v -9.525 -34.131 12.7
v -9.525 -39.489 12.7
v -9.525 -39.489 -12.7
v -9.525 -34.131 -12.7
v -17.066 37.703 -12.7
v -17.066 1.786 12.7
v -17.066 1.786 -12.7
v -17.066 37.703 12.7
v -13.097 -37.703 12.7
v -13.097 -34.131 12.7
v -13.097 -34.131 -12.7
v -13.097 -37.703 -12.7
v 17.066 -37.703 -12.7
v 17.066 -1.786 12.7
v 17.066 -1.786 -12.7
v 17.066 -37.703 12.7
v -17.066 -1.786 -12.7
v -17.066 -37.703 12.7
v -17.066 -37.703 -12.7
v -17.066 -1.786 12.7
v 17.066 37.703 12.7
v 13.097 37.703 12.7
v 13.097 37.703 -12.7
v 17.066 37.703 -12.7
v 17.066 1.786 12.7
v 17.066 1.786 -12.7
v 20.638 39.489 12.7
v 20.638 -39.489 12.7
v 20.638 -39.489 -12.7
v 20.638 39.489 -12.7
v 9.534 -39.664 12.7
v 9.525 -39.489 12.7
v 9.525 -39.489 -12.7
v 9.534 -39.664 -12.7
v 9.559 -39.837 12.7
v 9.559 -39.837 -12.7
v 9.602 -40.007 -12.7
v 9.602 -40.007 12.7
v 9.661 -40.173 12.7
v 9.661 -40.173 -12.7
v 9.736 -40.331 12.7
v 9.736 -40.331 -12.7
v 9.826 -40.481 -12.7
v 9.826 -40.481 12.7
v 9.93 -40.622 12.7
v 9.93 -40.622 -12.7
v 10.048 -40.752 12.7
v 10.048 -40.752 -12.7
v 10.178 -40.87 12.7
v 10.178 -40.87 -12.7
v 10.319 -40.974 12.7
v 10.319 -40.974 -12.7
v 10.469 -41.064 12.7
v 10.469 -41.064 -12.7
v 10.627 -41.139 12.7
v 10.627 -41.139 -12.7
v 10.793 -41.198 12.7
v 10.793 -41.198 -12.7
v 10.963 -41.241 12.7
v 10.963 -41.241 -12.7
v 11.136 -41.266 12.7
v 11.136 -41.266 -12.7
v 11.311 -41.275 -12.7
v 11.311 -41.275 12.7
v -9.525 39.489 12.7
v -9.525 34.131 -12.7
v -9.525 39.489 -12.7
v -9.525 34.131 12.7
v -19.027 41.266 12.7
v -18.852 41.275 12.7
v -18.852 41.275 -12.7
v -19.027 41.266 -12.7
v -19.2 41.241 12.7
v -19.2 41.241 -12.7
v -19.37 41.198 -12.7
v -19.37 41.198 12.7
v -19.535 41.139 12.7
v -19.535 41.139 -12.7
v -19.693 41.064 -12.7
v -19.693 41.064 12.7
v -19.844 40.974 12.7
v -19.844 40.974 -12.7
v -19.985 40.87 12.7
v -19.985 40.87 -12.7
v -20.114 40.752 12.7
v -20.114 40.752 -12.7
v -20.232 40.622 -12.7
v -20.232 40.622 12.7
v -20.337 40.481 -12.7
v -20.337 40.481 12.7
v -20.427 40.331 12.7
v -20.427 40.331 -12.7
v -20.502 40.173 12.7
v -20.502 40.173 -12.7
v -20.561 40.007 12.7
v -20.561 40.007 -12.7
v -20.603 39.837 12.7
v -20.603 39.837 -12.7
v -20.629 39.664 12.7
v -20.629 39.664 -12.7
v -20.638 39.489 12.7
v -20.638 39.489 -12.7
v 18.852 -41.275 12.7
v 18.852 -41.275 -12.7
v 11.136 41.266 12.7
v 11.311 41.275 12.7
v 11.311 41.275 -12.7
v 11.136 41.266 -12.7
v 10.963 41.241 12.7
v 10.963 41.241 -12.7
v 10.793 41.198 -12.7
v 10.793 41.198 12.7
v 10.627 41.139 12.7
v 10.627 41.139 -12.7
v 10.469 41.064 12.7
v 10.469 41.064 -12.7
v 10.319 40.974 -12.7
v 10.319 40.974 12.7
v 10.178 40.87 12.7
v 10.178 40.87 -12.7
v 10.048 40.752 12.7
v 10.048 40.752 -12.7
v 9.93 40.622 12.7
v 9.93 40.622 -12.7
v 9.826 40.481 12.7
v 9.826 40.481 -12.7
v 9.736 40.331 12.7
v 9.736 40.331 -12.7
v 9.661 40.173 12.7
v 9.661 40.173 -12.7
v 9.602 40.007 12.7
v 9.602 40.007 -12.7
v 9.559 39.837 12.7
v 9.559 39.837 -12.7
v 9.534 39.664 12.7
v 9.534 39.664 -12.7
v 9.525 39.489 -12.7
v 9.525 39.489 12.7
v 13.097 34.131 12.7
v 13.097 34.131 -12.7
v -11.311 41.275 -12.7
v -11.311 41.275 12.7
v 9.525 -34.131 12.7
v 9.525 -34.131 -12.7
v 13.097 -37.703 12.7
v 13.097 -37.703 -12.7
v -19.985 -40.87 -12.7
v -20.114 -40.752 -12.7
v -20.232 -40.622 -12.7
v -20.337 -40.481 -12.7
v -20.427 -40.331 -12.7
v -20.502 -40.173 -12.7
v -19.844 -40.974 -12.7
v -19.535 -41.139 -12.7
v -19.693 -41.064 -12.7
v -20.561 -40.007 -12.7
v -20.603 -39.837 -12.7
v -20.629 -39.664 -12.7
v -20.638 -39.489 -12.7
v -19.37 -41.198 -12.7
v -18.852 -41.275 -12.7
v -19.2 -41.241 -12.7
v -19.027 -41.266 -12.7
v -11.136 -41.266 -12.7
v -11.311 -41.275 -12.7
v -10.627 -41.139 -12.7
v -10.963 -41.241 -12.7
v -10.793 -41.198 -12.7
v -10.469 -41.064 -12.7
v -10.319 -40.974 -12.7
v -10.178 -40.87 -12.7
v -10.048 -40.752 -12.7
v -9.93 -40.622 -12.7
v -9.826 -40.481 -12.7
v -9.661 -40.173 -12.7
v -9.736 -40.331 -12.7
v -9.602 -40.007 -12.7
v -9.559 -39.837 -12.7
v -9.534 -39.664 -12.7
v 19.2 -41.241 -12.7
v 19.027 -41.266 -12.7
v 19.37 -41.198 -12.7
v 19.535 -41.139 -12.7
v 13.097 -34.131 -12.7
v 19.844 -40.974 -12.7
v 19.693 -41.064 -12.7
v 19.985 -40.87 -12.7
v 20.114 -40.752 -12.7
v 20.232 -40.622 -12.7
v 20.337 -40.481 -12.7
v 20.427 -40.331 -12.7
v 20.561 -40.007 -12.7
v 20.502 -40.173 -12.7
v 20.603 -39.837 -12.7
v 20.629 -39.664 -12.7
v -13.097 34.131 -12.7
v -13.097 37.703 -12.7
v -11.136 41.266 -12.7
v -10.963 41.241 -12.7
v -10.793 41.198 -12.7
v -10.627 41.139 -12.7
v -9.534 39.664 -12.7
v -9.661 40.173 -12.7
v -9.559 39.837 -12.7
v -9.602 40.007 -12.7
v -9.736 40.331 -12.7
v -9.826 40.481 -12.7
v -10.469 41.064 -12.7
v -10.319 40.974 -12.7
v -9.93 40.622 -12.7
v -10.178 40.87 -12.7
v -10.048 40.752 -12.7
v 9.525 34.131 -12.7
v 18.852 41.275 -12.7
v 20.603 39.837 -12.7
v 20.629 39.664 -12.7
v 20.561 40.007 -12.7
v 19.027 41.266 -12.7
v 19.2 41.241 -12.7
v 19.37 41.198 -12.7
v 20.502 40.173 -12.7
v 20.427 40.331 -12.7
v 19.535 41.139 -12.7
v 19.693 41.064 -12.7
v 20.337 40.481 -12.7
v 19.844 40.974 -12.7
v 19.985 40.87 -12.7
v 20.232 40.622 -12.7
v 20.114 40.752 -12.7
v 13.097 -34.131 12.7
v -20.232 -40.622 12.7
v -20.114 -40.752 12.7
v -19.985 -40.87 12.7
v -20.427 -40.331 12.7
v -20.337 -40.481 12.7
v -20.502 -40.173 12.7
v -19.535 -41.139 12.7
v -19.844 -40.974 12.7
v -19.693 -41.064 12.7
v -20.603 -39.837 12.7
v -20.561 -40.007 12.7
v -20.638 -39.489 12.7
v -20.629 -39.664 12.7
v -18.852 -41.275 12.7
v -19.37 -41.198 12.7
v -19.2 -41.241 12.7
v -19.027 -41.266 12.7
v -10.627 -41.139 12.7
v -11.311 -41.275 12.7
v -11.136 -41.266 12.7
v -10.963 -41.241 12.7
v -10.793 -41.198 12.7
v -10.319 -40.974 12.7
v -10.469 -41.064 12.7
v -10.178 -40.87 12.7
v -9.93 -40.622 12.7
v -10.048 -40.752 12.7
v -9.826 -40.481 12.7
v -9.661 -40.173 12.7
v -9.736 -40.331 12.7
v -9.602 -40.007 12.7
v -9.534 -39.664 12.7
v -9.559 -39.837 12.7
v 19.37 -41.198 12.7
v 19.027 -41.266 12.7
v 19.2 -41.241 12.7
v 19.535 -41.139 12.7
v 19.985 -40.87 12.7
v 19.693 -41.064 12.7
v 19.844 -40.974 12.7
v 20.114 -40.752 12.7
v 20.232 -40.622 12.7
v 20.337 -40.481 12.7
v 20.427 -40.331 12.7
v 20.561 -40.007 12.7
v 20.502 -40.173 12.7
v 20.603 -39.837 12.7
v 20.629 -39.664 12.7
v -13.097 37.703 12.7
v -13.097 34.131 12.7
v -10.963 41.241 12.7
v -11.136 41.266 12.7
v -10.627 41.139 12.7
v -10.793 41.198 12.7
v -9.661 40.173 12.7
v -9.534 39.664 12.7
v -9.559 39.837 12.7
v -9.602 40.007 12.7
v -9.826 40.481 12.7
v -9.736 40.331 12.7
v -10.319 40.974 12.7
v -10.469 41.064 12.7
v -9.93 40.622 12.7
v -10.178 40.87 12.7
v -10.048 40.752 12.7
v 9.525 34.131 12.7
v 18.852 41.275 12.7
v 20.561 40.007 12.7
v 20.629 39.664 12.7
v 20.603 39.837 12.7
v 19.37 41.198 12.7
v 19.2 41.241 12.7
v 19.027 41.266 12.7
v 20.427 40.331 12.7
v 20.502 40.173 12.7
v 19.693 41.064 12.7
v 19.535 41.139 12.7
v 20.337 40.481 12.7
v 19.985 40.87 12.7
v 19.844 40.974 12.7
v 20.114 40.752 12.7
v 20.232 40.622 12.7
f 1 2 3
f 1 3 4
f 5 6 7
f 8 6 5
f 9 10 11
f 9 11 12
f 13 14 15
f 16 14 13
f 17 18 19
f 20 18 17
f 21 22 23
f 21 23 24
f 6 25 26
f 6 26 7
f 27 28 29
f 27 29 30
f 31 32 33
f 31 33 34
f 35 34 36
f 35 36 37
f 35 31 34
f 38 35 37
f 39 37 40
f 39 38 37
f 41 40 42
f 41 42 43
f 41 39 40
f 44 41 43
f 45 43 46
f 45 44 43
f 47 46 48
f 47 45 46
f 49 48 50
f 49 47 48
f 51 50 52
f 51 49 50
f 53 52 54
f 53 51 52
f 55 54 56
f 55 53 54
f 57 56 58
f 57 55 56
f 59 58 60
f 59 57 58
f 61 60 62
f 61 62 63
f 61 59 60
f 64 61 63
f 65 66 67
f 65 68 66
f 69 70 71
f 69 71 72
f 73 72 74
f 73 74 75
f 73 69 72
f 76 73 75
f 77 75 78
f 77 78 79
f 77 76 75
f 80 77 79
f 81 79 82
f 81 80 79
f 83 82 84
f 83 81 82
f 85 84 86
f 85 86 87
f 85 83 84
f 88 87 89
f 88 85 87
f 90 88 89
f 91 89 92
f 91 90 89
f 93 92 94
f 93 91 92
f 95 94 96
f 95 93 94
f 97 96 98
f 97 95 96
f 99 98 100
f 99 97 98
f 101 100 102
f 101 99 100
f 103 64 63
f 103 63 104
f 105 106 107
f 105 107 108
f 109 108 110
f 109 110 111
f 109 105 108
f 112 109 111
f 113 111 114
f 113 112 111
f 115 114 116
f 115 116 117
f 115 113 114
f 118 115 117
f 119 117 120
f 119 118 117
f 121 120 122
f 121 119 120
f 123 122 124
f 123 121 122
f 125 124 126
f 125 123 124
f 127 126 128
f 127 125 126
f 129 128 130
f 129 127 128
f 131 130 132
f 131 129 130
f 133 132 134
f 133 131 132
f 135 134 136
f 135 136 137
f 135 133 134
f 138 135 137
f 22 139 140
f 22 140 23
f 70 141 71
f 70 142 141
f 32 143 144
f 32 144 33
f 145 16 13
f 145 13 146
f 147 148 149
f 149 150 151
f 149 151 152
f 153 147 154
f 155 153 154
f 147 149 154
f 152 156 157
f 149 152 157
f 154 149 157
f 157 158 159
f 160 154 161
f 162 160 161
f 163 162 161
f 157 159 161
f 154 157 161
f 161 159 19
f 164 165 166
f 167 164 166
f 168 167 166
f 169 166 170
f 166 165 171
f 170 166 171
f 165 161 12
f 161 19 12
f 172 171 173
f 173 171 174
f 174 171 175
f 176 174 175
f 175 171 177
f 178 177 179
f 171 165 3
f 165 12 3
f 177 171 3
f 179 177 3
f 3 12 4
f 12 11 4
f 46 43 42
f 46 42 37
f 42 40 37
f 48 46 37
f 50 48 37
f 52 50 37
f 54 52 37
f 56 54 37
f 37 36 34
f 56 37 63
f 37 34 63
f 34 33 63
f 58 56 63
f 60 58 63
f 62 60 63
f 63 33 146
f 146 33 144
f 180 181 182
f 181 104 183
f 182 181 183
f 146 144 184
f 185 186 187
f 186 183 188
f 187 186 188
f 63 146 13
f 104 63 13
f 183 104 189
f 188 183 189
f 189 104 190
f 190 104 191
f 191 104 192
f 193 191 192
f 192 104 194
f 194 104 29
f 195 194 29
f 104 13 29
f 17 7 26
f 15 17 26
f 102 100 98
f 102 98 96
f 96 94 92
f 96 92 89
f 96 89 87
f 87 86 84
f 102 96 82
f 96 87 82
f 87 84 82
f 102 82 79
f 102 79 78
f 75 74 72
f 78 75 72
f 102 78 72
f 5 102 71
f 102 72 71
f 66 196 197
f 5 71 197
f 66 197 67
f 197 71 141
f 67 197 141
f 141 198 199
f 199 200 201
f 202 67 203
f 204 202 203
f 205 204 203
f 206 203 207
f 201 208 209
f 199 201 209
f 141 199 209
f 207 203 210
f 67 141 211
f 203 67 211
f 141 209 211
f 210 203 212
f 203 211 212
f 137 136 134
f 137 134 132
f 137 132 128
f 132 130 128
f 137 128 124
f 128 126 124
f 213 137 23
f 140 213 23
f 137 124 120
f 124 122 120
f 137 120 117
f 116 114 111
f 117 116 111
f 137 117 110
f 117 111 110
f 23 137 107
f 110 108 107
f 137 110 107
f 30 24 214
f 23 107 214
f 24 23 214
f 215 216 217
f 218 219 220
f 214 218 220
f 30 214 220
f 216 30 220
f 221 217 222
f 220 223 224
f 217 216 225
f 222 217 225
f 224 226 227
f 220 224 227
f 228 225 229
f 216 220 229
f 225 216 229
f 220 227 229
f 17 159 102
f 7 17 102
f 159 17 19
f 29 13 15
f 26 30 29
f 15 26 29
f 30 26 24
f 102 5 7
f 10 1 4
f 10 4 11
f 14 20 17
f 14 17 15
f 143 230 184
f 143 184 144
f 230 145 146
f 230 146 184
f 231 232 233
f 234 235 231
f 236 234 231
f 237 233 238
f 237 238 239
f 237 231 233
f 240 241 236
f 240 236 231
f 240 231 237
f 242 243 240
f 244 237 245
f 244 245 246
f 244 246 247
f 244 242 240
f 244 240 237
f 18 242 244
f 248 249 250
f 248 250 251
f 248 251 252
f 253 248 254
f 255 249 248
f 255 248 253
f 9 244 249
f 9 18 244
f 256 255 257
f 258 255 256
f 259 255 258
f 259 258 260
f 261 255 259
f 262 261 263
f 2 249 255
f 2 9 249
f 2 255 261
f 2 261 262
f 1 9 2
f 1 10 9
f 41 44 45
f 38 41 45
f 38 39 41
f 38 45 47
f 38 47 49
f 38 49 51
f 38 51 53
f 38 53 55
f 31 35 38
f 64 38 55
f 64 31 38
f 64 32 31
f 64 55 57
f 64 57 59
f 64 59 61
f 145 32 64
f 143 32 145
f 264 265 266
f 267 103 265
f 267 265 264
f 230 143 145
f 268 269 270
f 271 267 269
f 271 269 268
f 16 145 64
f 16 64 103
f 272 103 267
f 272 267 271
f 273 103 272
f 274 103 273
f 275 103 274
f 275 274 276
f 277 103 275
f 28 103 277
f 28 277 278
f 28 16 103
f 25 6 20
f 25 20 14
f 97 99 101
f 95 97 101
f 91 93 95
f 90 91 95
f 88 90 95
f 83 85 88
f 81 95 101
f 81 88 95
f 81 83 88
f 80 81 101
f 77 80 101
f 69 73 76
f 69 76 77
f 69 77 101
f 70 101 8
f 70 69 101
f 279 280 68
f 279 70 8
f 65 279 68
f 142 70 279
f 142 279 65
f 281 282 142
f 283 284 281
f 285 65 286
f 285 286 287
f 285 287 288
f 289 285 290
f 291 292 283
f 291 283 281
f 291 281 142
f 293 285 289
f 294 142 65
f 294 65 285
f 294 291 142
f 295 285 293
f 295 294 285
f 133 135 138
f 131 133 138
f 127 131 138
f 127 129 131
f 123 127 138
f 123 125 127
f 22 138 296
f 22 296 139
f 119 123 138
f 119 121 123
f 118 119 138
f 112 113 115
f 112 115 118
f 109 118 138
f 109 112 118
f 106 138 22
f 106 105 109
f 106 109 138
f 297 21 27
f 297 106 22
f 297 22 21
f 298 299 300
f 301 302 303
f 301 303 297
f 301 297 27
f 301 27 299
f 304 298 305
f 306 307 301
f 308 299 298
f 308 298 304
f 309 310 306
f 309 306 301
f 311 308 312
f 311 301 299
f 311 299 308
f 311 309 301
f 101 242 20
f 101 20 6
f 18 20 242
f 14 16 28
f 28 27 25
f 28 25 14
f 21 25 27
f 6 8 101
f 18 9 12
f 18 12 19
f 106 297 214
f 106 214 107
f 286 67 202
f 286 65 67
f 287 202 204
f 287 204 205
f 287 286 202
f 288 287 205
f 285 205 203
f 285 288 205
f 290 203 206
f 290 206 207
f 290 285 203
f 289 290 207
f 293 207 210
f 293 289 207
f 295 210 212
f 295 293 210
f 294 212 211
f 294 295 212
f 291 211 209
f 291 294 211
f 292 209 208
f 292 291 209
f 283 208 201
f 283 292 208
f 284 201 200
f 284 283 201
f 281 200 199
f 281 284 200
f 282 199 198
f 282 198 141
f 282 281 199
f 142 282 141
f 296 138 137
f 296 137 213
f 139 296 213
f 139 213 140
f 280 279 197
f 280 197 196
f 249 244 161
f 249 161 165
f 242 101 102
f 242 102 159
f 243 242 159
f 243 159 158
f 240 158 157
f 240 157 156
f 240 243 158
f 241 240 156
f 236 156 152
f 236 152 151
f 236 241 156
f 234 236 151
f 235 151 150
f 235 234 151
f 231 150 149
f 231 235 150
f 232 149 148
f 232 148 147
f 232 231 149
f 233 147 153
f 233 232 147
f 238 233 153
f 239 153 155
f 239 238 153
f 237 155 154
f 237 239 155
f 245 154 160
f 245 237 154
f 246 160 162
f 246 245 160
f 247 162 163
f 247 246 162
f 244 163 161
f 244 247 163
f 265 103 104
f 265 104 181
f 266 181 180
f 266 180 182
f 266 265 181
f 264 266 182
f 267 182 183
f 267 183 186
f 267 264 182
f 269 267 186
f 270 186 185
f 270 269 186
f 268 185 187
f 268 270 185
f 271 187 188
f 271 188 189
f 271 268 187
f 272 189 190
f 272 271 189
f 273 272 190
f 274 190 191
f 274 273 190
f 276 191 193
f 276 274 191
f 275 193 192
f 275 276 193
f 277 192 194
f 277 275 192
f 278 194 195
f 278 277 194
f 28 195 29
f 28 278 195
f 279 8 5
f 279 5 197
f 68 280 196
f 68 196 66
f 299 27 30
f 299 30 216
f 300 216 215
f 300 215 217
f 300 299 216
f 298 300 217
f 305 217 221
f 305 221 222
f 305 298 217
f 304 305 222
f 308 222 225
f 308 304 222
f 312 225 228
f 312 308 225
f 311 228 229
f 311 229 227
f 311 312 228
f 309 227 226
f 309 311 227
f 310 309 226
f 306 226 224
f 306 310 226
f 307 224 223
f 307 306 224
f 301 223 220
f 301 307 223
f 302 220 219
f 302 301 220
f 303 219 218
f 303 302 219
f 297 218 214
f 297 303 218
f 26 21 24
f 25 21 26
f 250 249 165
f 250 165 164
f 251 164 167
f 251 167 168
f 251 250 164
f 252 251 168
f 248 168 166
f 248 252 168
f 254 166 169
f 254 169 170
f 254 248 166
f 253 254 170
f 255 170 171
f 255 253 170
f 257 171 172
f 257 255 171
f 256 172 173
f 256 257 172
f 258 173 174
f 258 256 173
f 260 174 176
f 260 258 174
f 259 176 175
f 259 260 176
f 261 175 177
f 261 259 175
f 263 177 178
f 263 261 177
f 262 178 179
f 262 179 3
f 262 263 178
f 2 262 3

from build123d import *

# Parameters (mm, degrees)
BASE_EXTRUDE_DEPTH = 12.7


with BuildPart() as part:
    # Sketch1 → Base-Extrude (new, symmetric)
    with BuildSketch(Plane.XY):
        with BuildLine():
            Line((-11.3109375, 41.275), (-18.8515625, 41.275))
            ThreePointArc((-18.8515625, 41.275), (-20.114411017, 40.751911017), (-20.6375, 39.4890625))
            Line((-20.6375, 39.4890625), (-20.6375, -39.4890625))
            ThreePointArc((-20.6375, -39.4890625), (-20.114411017, -40.751911017), (-18.8515625, -41.275))
            Line((-18.8515625, -41.275), (-11.3109375, -41.275))
            ThreePointArc((-11.3109375, -41.275), (-10.048088983, -40.751911017), (-9.525, -39.4890625))
            Line((-9.525, -39.4890625), (-9.525, -34.13125))
            Line((-9.525, -34.13125), (-13.096875, -34.13125))
            Line((-13.096875, -34.13125), (-13.096875, -37.703125))
            Line((-13.096875, -37.703125), (-17.065625, -37.703125))
            Line((-17.065625, -37.703125), (-17.065625, -1.7859375))
            Line((-17.065625, -1.7859375), (17.065625, -1.7859375))
            Line((17.065625, -1.7859375), (17.065625, -37.703125))
            Line((17.065625, -37.703125), (13.096875, -37.703125))
            Line((13.096875, -37.703125), (13.096875, -34.13125))
            Line((13.096875, -34.13125), (9.525, -34.13125))
            Line((9.525, -34.13125), (9.525, -39.4890625))
            ThreePointArc((9.525, -39.4890625), (10.048088983, -40.751911017), (11.3109375, -41.275))
            Line((11.3109375, -41.275), (18.8515625, -41.275))
            ThreePointArc((18.8515625, -41.275), (20.114411017, -40.751911017), (20.6375, -39.4890625))
            Line((20.6375, -39.4890625), (20.6375, 39.4890625))
            ThreePointArc((20.6375, 39.4890625), (20.114411017, 40.751911017), (18.8515625, 41.275))
            Line((18.8515625, 41.275), (11.3109375, 41.275))
            ThreePointArc((11.3109375, 41.275), (10.048088983, 40.751911017), (9.525, 39.4890625))
            Line((9.525, 39.4890625), (9.525, 34.13125))
            Line((9.525, 34.13125), (13.096875, 34.13125))
            Line((13.096875, 34.13125), (13.096875, 37.703125))
            Line((13.096875, 37.703125), (17.065625, 37.703125))
            Line((17.065625, 37.703125), (17.065625, 1.7859375))
            Line((17.065625, 1.7859375), (-17.065625, 1.7859375))
            Line((-17.065625, 1.7859375), (-17.065625, 37.703125))
            Line((-17.065625, 37.703125), (-13.096875, 37.703125))
            Line((-13.096875, 37.703125), (-13.096875, 34.13125))
            Line((-13.096875, 34.13125), (-9.525, 34.13125))
            Line((-9.525, 34.13125), (-9.525, 39.4890625))
            ThreePointArc((-9.525, 39.4890625), (-10.048088983, 40.751911017), (-11.3109375, 41.275))
        make_face()
    extrude(amount=BASE_EXTRUDE_DEPTH, both=True)


solid = part.part
